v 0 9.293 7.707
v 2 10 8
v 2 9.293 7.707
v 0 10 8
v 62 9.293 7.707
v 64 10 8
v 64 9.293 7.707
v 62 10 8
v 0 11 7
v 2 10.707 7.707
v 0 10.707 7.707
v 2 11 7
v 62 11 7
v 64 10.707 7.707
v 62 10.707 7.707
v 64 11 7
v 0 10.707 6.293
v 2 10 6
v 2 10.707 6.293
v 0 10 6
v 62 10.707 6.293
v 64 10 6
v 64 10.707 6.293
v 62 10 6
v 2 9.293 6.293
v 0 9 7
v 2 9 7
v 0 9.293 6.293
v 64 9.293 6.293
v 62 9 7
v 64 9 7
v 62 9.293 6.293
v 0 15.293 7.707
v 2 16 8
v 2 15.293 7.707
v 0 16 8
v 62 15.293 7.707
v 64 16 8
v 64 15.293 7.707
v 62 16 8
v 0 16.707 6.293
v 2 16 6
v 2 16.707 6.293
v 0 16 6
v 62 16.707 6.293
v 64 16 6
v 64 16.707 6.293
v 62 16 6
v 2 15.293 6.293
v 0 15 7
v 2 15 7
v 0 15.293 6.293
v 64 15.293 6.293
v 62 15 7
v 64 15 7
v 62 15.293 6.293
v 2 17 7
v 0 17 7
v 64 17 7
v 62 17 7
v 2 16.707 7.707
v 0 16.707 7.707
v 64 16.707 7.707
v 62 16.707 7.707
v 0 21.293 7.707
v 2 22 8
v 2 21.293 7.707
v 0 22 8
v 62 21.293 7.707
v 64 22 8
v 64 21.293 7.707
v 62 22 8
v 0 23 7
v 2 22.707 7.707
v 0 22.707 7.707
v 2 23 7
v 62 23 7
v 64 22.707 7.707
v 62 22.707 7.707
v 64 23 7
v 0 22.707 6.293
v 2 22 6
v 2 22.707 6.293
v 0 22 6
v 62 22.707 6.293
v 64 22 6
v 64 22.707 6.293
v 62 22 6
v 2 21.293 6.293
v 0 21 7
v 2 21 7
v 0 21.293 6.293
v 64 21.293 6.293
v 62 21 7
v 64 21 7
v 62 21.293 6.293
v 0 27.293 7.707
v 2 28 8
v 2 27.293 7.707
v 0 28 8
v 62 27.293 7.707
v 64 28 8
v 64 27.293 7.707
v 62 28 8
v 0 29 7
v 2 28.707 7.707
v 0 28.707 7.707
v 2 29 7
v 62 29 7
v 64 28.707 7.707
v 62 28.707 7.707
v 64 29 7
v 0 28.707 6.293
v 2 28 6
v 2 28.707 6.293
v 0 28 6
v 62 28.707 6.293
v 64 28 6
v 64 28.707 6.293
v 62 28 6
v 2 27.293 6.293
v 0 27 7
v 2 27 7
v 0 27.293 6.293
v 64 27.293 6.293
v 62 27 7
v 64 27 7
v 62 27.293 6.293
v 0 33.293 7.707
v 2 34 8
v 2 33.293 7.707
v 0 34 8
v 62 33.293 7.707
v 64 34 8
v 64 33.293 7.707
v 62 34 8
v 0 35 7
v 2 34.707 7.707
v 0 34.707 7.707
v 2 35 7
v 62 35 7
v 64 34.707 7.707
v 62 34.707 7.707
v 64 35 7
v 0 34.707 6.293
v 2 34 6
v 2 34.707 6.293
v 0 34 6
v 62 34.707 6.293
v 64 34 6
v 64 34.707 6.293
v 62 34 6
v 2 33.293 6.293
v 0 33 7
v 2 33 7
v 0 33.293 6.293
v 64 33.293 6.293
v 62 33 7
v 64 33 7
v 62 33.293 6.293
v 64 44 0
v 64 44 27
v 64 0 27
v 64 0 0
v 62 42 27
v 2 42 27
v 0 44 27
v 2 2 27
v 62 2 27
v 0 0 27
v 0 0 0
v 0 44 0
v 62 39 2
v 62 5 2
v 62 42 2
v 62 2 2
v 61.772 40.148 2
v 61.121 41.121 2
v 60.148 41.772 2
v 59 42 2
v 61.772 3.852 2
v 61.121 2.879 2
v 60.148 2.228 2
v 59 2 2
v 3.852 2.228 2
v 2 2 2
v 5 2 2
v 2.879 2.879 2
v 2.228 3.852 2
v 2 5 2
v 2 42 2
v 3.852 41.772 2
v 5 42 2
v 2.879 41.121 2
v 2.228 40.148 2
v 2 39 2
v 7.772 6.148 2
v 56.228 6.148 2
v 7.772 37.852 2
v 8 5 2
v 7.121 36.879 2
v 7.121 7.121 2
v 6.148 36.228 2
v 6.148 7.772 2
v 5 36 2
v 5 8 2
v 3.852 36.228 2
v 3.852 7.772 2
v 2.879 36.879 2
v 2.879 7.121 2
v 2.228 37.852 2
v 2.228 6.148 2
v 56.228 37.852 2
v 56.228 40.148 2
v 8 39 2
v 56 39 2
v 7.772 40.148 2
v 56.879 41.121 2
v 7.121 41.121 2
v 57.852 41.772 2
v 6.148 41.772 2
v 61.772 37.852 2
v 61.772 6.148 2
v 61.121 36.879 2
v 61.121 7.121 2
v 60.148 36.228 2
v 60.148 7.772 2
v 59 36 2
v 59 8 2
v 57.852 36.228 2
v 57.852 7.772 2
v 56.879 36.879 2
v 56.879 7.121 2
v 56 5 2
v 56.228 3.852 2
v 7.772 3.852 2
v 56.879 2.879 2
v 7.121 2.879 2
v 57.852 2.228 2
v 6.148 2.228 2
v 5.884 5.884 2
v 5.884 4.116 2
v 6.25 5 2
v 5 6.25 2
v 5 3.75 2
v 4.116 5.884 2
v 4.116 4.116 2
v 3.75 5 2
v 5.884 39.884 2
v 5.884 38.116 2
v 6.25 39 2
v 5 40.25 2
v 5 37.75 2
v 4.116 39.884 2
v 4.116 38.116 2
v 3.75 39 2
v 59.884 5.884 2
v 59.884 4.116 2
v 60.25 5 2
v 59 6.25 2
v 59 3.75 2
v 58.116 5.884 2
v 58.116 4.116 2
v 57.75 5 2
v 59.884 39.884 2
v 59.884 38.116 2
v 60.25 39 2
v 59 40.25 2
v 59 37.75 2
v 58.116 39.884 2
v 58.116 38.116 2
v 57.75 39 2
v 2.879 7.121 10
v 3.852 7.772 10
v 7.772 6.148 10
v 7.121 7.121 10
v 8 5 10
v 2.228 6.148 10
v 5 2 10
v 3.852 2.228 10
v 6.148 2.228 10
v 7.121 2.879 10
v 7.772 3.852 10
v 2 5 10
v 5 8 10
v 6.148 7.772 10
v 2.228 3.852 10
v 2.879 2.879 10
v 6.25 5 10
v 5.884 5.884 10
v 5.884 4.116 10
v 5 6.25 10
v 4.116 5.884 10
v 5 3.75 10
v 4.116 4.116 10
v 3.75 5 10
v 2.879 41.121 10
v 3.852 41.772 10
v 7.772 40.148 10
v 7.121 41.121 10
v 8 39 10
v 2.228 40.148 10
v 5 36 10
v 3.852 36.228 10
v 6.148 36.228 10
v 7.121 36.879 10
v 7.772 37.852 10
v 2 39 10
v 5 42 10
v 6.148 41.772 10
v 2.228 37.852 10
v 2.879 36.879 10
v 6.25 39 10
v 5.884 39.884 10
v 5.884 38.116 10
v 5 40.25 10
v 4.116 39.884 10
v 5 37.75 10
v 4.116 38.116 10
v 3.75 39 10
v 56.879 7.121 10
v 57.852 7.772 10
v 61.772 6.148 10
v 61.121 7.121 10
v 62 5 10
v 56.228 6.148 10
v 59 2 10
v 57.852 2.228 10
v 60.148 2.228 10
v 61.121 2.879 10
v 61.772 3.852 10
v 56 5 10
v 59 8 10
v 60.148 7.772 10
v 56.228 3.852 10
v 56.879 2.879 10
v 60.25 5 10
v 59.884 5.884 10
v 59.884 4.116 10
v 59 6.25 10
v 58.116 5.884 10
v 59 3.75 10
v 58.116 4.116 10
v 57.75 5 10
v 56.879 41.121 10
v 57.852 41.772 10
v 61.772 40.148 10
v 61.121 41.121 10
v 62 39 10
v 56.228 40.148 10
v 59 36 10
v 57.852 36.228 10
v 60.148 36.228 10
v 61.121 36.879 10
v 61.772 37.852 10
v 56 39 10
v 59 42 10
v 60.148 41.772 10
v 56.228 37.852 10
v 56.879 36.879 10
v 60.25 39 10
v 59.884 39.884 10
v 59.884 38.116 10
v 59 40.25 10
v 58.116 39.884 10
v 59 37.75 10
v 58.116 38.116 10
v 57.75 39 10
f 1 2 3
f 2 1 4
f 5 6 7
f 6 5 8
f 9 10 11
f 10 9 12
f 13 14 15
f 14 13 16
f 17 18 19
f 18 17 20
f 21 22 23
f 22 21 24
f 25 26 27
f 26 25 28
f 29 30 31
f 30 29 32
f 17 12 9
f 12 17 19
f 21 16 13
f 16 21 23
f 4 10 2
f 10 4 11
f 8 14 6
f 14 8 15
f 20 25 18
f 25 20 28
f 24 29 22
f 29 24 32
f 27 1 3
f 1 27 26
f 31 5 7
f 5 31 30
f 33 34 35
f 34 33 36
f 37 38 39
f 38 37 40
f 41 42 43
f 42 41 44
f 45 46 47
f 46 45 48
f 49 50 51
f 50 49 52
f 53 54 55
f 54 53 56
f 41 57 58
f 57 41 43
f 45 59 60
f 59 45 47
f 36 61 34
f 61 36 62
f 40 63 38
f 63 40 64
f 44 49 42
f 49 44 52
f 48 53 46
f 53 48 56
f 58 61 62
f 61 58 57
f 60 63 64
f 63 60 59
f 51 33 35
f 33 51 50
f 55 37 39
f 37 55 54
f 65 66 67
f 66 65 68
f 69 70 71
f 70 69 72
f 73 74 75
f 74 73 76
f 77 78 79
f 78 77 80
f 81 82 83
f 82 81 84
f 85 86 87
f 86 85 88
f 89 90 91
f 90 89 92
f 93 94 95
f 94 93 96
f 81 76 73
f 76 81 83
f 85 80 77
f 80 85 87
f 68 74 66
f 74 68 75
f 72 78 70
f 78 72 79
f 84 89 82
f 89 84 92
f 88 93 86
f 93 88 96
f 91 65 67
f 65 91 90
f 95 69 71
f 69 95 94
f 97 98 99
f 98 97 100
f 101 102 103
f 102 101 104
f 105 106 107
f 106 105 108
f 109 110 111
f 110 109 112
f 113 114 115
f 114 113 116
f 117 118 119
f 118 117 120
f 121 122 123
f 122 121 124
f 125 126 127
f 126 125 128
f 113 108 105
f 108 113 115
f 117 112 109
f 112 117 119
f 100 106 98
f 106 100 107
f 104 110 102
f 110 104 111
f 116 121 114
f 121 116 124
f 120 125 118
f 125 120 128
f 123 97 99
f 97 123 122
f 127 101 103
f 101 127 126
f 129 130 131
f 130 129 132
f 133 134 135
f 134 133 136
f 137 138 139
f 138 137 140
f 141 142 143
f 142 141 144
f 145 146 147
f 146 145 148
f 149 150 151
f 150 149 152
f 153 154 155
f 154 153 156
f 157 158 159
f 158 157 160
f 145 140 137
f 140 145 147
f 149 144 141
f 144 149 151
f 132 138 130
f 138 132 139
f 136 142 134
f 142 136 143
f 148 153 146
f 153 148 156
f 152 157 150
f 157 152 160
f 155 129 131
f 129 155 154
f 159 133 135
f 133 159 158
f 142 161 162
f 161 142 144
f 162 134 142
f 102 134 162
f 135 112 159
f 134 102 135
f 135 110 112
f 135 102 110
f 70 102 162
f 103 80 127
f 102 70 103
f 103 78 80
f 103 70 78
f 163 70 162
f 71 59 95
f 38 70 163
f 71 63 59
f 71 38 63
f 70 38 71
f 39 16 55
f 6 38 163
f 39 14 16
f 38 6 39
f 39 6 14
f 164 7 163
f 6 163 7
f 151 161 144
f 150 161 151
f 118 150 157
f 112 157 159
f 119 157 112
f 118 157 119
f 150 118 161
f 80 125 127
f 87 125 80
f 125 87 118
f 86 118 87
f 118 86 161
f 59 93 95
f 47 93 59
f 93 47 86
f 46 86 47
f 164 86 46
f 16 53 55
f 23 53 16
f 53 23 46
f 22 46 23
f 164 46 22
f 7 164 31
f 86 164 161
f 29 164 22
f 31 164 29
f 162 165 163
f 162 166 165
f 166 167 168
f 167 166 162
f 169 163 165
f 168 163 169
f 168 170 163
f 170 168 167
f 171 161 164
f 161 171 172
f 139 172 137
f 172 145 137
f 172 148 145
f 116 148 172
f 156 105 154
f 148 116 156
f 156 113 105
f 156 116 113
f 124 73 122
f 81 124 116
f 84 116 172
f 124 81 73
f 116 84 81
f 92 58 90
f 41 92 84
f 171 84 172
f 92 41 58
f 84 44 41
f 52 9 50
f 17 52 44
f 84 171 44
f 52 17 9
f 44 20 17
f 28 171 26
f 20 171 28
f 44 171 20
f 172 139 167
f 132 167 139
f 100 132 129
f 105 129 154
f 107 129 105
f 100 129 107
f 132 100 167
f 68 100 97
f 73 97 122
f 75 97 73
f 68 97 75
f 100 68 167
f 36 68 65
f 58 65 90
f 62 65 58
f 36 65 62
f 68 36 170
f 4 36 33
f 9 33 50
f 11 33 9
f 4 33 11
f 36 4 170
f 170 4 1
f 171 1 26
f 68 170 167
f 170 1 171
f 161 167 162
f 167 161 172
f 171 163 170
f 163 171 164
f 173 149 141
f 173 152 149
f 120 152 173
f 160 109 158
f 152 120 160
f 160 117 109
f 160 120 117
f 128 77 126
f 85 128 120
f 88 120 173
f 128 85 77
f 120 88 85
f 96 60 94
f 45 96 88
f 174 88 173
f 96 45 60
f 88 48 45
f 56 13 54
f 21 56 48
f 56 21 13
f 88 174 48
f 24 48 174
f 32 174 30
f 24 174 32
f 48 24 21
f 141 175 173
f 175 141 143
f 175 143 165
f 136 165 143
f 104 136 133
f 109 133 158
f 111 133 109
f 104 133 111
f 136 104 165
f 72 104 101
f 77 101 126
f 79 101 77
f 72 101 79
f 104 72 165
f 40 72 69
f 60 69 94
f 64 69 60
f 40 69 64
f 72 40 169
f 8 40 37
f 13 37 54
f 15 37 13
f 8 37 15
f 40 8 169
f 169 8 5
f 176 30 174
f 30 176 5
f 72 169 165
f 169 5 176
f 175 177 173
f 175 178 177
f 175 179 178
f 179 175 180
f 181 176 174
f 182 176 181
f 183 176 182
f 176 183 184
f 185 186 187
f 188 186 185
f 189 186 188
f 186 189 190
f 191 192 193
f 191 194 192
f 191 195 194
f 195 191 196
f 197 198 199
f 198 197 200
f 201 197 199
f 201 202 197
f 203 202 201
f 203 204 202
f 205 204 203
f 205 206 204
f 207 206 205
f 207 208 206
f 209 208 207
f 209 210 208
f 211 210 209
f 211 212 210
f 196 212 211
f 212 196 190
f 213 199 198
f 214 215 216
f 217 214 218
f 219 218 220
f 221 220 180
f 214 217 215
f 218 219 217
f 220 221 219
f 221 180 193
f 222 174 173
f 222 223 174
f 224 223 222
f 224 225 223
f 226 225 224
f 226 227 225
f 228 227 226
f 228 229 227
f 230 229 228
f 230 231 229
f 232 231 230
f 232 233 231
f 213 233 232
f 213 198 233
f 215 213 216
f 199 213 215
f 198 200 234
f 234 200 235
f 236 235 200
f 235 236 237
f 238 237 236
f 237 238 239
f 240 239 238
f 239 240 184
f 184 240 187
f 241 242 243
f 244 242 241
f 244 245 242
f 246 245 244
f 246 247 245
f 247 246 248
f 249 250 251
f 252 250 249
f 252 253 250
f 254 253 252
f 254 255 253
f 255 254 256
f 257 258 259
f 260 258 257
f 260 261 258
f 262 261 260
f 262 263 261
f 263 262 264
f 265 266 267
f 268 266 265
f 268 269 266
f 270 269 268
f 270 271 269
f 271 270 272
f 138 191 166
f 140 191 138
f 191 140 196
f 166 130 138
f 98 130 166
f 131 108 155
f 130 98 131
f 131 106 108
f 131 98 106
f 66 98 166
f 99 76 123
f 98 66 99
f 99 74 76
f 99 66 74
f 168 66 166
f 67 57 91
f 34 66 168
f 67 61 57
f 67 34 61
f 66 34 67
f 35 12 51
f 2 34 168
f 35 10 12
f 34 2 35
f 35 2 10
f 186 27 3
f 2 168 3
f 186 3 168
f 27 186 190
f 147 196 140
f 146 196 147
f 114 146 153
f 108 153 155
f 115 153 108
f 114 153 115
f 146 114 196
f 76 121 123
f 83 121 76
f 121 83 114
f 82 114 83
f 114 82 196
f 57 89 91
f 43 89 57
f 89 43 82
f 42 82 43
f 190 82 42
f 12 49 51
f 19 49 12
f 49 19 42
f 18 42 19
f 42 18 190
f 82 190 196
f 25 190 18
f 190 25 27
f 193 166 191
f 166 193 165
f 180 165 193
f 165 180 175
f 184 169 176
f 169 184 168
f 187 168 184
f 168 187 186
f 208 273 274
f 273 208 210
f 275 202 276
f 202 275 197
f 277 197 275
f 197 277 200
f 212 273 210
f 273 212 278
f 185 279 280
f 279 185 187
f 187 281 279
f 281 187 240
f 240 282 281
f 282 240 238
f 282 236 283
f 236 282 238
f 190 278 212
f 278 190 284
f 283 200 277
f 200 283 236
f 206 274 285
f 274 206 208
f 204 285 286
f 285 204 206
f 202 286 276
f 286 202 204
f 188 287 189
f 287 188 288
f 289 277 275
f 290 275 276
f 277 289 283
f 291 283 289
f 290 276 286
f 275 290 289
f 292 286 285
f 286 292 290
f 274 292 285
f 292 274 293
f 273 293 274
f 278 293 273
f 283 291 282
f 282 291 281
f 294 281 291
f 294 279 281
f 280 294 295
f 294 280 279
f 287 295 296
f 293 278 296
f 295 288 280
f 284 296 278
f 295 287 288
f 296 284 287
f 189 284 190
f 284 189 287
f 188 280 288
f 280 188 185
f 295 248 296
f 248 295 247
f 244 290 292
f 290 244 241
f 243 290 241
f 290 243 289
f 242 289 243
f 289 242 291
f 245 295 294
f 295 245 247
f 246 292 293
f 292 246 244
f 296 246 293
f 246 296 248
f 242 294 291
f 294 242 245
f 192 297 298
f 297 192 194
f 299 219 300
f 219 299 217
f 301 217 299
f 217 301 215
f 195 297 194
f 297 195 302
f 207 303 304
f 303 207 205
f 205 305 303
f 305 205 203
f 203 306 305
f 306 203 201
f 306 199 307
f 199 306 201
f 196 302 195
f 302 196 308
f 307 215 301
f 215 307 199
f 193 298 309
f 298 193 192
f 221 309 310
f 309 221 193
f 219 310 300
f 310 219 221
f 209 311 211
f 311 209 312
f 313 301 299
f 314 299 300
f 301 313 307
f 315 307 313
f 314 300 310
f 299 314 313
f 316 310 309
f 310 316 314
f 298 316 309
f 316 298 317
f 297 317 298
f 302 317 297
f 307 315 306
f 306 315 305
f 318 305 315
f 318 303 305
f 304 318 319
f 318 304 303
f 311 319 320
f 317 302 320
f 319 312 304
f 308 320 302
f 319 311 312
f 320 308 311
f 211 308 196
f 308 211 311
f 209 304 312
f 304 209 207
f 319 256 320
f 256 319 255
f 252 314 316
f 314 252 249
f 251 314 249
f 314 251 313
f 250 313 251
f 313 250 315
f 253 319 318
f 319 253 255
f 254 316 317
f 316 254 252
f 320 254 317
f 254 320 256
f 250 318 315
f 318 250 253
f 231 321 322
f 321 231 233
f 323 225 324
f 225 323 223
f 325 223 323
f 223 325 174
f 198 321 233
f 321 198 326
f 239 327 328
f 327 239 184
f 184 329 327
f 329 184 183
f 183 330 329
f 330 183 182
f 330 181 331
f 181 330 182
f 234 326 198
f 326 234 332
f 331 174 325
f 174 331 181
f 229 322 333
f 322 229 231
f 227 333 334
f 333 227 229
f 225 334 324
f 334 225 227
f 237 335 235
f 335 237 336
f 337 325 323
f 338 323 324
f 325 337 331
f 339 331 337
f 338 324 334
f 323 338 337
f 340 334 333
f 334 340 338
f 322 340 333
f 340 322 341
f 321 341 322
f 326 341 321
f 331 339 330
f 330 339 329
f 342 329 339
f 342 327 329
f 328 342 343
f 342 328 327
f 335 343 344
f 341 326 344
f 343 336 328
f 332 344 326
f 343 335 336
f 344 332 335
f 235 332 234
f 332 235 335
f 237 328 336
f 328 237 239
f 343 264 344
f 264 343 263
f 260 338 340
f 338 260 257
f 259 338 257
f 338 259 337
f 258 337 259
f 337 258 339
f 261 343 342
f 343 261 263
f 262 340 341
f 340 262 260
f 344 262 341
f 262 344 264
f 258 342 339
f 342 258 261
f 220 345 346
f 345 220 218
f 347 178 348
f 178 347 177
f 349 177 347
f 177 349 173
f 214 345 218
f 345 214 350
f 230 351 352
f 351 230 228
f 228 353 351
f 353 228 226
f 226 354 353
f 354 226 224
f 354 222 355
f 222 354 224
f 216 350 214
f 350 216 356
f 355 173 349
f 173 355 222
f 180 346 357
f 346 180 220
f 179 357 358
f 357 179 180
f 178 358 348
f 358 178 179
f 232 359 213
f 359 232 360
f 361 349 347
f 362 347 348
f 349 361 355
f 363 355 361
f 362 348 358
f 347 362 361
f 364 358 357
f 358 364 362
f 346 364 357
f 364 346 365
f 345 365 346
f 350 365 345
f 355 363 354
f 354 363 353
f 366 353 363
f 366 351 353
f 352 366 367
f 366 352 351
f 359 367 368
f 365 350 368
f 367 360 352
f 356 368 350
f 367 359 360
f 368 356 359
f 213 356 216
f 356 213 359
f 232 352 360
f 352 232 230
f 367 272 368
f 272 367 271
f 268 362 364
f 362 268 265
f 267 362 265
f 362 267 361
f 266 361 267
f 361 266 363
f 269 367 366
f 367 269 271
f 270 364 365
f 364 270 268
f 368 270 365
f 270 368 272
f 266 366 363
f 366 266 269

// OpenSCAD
// Parametric Electronics Enclosure

/* [Enclosure Size] */
inner_width = 60;     // [30:120]
inner_depth = 40;     // [20:80]
inner_height = 25;    // [15:50]
wall = 2;             // [1.5:0.5:4]
corner_radius = 3;    // [0:8]

/* [Features] */
vent_holes = true;    //
mounting_posts = true; //
post_diameter = 6;    // [4:10]
post_height = 8;      // [4:15]
screw_diameter = 2.5; // [2:4]

outer_width = inner_width + 2*wall;
outer_depth = inner_depth + 2*wall;
outer_height = inner_height + wall;

// Main body
difference() {
    // Outer shell
    cube([outer_width, outer_depth, outer_height]);

    // Inner cavity
    translate([wall, wall, wall])
        cube([inner_width, inner_depth, inner_height + 1]);

    // Vent holes on side
    if (vent_holes) {
        for (i = [0:4]) {
            translate([-1, 10 + i*6, wall + 5])
                rotate([0, 90, 0])
                    cylinder(h=outer_width+2, d=2, $fn=8);
        }
    }
}

// Mounting posts
if (mounting_posts) {
    for (x = [wall + post_diameter/2, outer_width - wall - post_diameter/2]) {
        for (y = [wall + post_diameter/2, outer_depth - wall - post_diameter/2]) {
            translate([x, y, wall])
                difference() {
                    cylinder(h=post_height, d=post_diameter, $fn=16);
                    translate([0, 0, -1])
                        cylinder(h=post_height+2, d=screw_diameter, $fn=8);
                }
        }
    }
}
